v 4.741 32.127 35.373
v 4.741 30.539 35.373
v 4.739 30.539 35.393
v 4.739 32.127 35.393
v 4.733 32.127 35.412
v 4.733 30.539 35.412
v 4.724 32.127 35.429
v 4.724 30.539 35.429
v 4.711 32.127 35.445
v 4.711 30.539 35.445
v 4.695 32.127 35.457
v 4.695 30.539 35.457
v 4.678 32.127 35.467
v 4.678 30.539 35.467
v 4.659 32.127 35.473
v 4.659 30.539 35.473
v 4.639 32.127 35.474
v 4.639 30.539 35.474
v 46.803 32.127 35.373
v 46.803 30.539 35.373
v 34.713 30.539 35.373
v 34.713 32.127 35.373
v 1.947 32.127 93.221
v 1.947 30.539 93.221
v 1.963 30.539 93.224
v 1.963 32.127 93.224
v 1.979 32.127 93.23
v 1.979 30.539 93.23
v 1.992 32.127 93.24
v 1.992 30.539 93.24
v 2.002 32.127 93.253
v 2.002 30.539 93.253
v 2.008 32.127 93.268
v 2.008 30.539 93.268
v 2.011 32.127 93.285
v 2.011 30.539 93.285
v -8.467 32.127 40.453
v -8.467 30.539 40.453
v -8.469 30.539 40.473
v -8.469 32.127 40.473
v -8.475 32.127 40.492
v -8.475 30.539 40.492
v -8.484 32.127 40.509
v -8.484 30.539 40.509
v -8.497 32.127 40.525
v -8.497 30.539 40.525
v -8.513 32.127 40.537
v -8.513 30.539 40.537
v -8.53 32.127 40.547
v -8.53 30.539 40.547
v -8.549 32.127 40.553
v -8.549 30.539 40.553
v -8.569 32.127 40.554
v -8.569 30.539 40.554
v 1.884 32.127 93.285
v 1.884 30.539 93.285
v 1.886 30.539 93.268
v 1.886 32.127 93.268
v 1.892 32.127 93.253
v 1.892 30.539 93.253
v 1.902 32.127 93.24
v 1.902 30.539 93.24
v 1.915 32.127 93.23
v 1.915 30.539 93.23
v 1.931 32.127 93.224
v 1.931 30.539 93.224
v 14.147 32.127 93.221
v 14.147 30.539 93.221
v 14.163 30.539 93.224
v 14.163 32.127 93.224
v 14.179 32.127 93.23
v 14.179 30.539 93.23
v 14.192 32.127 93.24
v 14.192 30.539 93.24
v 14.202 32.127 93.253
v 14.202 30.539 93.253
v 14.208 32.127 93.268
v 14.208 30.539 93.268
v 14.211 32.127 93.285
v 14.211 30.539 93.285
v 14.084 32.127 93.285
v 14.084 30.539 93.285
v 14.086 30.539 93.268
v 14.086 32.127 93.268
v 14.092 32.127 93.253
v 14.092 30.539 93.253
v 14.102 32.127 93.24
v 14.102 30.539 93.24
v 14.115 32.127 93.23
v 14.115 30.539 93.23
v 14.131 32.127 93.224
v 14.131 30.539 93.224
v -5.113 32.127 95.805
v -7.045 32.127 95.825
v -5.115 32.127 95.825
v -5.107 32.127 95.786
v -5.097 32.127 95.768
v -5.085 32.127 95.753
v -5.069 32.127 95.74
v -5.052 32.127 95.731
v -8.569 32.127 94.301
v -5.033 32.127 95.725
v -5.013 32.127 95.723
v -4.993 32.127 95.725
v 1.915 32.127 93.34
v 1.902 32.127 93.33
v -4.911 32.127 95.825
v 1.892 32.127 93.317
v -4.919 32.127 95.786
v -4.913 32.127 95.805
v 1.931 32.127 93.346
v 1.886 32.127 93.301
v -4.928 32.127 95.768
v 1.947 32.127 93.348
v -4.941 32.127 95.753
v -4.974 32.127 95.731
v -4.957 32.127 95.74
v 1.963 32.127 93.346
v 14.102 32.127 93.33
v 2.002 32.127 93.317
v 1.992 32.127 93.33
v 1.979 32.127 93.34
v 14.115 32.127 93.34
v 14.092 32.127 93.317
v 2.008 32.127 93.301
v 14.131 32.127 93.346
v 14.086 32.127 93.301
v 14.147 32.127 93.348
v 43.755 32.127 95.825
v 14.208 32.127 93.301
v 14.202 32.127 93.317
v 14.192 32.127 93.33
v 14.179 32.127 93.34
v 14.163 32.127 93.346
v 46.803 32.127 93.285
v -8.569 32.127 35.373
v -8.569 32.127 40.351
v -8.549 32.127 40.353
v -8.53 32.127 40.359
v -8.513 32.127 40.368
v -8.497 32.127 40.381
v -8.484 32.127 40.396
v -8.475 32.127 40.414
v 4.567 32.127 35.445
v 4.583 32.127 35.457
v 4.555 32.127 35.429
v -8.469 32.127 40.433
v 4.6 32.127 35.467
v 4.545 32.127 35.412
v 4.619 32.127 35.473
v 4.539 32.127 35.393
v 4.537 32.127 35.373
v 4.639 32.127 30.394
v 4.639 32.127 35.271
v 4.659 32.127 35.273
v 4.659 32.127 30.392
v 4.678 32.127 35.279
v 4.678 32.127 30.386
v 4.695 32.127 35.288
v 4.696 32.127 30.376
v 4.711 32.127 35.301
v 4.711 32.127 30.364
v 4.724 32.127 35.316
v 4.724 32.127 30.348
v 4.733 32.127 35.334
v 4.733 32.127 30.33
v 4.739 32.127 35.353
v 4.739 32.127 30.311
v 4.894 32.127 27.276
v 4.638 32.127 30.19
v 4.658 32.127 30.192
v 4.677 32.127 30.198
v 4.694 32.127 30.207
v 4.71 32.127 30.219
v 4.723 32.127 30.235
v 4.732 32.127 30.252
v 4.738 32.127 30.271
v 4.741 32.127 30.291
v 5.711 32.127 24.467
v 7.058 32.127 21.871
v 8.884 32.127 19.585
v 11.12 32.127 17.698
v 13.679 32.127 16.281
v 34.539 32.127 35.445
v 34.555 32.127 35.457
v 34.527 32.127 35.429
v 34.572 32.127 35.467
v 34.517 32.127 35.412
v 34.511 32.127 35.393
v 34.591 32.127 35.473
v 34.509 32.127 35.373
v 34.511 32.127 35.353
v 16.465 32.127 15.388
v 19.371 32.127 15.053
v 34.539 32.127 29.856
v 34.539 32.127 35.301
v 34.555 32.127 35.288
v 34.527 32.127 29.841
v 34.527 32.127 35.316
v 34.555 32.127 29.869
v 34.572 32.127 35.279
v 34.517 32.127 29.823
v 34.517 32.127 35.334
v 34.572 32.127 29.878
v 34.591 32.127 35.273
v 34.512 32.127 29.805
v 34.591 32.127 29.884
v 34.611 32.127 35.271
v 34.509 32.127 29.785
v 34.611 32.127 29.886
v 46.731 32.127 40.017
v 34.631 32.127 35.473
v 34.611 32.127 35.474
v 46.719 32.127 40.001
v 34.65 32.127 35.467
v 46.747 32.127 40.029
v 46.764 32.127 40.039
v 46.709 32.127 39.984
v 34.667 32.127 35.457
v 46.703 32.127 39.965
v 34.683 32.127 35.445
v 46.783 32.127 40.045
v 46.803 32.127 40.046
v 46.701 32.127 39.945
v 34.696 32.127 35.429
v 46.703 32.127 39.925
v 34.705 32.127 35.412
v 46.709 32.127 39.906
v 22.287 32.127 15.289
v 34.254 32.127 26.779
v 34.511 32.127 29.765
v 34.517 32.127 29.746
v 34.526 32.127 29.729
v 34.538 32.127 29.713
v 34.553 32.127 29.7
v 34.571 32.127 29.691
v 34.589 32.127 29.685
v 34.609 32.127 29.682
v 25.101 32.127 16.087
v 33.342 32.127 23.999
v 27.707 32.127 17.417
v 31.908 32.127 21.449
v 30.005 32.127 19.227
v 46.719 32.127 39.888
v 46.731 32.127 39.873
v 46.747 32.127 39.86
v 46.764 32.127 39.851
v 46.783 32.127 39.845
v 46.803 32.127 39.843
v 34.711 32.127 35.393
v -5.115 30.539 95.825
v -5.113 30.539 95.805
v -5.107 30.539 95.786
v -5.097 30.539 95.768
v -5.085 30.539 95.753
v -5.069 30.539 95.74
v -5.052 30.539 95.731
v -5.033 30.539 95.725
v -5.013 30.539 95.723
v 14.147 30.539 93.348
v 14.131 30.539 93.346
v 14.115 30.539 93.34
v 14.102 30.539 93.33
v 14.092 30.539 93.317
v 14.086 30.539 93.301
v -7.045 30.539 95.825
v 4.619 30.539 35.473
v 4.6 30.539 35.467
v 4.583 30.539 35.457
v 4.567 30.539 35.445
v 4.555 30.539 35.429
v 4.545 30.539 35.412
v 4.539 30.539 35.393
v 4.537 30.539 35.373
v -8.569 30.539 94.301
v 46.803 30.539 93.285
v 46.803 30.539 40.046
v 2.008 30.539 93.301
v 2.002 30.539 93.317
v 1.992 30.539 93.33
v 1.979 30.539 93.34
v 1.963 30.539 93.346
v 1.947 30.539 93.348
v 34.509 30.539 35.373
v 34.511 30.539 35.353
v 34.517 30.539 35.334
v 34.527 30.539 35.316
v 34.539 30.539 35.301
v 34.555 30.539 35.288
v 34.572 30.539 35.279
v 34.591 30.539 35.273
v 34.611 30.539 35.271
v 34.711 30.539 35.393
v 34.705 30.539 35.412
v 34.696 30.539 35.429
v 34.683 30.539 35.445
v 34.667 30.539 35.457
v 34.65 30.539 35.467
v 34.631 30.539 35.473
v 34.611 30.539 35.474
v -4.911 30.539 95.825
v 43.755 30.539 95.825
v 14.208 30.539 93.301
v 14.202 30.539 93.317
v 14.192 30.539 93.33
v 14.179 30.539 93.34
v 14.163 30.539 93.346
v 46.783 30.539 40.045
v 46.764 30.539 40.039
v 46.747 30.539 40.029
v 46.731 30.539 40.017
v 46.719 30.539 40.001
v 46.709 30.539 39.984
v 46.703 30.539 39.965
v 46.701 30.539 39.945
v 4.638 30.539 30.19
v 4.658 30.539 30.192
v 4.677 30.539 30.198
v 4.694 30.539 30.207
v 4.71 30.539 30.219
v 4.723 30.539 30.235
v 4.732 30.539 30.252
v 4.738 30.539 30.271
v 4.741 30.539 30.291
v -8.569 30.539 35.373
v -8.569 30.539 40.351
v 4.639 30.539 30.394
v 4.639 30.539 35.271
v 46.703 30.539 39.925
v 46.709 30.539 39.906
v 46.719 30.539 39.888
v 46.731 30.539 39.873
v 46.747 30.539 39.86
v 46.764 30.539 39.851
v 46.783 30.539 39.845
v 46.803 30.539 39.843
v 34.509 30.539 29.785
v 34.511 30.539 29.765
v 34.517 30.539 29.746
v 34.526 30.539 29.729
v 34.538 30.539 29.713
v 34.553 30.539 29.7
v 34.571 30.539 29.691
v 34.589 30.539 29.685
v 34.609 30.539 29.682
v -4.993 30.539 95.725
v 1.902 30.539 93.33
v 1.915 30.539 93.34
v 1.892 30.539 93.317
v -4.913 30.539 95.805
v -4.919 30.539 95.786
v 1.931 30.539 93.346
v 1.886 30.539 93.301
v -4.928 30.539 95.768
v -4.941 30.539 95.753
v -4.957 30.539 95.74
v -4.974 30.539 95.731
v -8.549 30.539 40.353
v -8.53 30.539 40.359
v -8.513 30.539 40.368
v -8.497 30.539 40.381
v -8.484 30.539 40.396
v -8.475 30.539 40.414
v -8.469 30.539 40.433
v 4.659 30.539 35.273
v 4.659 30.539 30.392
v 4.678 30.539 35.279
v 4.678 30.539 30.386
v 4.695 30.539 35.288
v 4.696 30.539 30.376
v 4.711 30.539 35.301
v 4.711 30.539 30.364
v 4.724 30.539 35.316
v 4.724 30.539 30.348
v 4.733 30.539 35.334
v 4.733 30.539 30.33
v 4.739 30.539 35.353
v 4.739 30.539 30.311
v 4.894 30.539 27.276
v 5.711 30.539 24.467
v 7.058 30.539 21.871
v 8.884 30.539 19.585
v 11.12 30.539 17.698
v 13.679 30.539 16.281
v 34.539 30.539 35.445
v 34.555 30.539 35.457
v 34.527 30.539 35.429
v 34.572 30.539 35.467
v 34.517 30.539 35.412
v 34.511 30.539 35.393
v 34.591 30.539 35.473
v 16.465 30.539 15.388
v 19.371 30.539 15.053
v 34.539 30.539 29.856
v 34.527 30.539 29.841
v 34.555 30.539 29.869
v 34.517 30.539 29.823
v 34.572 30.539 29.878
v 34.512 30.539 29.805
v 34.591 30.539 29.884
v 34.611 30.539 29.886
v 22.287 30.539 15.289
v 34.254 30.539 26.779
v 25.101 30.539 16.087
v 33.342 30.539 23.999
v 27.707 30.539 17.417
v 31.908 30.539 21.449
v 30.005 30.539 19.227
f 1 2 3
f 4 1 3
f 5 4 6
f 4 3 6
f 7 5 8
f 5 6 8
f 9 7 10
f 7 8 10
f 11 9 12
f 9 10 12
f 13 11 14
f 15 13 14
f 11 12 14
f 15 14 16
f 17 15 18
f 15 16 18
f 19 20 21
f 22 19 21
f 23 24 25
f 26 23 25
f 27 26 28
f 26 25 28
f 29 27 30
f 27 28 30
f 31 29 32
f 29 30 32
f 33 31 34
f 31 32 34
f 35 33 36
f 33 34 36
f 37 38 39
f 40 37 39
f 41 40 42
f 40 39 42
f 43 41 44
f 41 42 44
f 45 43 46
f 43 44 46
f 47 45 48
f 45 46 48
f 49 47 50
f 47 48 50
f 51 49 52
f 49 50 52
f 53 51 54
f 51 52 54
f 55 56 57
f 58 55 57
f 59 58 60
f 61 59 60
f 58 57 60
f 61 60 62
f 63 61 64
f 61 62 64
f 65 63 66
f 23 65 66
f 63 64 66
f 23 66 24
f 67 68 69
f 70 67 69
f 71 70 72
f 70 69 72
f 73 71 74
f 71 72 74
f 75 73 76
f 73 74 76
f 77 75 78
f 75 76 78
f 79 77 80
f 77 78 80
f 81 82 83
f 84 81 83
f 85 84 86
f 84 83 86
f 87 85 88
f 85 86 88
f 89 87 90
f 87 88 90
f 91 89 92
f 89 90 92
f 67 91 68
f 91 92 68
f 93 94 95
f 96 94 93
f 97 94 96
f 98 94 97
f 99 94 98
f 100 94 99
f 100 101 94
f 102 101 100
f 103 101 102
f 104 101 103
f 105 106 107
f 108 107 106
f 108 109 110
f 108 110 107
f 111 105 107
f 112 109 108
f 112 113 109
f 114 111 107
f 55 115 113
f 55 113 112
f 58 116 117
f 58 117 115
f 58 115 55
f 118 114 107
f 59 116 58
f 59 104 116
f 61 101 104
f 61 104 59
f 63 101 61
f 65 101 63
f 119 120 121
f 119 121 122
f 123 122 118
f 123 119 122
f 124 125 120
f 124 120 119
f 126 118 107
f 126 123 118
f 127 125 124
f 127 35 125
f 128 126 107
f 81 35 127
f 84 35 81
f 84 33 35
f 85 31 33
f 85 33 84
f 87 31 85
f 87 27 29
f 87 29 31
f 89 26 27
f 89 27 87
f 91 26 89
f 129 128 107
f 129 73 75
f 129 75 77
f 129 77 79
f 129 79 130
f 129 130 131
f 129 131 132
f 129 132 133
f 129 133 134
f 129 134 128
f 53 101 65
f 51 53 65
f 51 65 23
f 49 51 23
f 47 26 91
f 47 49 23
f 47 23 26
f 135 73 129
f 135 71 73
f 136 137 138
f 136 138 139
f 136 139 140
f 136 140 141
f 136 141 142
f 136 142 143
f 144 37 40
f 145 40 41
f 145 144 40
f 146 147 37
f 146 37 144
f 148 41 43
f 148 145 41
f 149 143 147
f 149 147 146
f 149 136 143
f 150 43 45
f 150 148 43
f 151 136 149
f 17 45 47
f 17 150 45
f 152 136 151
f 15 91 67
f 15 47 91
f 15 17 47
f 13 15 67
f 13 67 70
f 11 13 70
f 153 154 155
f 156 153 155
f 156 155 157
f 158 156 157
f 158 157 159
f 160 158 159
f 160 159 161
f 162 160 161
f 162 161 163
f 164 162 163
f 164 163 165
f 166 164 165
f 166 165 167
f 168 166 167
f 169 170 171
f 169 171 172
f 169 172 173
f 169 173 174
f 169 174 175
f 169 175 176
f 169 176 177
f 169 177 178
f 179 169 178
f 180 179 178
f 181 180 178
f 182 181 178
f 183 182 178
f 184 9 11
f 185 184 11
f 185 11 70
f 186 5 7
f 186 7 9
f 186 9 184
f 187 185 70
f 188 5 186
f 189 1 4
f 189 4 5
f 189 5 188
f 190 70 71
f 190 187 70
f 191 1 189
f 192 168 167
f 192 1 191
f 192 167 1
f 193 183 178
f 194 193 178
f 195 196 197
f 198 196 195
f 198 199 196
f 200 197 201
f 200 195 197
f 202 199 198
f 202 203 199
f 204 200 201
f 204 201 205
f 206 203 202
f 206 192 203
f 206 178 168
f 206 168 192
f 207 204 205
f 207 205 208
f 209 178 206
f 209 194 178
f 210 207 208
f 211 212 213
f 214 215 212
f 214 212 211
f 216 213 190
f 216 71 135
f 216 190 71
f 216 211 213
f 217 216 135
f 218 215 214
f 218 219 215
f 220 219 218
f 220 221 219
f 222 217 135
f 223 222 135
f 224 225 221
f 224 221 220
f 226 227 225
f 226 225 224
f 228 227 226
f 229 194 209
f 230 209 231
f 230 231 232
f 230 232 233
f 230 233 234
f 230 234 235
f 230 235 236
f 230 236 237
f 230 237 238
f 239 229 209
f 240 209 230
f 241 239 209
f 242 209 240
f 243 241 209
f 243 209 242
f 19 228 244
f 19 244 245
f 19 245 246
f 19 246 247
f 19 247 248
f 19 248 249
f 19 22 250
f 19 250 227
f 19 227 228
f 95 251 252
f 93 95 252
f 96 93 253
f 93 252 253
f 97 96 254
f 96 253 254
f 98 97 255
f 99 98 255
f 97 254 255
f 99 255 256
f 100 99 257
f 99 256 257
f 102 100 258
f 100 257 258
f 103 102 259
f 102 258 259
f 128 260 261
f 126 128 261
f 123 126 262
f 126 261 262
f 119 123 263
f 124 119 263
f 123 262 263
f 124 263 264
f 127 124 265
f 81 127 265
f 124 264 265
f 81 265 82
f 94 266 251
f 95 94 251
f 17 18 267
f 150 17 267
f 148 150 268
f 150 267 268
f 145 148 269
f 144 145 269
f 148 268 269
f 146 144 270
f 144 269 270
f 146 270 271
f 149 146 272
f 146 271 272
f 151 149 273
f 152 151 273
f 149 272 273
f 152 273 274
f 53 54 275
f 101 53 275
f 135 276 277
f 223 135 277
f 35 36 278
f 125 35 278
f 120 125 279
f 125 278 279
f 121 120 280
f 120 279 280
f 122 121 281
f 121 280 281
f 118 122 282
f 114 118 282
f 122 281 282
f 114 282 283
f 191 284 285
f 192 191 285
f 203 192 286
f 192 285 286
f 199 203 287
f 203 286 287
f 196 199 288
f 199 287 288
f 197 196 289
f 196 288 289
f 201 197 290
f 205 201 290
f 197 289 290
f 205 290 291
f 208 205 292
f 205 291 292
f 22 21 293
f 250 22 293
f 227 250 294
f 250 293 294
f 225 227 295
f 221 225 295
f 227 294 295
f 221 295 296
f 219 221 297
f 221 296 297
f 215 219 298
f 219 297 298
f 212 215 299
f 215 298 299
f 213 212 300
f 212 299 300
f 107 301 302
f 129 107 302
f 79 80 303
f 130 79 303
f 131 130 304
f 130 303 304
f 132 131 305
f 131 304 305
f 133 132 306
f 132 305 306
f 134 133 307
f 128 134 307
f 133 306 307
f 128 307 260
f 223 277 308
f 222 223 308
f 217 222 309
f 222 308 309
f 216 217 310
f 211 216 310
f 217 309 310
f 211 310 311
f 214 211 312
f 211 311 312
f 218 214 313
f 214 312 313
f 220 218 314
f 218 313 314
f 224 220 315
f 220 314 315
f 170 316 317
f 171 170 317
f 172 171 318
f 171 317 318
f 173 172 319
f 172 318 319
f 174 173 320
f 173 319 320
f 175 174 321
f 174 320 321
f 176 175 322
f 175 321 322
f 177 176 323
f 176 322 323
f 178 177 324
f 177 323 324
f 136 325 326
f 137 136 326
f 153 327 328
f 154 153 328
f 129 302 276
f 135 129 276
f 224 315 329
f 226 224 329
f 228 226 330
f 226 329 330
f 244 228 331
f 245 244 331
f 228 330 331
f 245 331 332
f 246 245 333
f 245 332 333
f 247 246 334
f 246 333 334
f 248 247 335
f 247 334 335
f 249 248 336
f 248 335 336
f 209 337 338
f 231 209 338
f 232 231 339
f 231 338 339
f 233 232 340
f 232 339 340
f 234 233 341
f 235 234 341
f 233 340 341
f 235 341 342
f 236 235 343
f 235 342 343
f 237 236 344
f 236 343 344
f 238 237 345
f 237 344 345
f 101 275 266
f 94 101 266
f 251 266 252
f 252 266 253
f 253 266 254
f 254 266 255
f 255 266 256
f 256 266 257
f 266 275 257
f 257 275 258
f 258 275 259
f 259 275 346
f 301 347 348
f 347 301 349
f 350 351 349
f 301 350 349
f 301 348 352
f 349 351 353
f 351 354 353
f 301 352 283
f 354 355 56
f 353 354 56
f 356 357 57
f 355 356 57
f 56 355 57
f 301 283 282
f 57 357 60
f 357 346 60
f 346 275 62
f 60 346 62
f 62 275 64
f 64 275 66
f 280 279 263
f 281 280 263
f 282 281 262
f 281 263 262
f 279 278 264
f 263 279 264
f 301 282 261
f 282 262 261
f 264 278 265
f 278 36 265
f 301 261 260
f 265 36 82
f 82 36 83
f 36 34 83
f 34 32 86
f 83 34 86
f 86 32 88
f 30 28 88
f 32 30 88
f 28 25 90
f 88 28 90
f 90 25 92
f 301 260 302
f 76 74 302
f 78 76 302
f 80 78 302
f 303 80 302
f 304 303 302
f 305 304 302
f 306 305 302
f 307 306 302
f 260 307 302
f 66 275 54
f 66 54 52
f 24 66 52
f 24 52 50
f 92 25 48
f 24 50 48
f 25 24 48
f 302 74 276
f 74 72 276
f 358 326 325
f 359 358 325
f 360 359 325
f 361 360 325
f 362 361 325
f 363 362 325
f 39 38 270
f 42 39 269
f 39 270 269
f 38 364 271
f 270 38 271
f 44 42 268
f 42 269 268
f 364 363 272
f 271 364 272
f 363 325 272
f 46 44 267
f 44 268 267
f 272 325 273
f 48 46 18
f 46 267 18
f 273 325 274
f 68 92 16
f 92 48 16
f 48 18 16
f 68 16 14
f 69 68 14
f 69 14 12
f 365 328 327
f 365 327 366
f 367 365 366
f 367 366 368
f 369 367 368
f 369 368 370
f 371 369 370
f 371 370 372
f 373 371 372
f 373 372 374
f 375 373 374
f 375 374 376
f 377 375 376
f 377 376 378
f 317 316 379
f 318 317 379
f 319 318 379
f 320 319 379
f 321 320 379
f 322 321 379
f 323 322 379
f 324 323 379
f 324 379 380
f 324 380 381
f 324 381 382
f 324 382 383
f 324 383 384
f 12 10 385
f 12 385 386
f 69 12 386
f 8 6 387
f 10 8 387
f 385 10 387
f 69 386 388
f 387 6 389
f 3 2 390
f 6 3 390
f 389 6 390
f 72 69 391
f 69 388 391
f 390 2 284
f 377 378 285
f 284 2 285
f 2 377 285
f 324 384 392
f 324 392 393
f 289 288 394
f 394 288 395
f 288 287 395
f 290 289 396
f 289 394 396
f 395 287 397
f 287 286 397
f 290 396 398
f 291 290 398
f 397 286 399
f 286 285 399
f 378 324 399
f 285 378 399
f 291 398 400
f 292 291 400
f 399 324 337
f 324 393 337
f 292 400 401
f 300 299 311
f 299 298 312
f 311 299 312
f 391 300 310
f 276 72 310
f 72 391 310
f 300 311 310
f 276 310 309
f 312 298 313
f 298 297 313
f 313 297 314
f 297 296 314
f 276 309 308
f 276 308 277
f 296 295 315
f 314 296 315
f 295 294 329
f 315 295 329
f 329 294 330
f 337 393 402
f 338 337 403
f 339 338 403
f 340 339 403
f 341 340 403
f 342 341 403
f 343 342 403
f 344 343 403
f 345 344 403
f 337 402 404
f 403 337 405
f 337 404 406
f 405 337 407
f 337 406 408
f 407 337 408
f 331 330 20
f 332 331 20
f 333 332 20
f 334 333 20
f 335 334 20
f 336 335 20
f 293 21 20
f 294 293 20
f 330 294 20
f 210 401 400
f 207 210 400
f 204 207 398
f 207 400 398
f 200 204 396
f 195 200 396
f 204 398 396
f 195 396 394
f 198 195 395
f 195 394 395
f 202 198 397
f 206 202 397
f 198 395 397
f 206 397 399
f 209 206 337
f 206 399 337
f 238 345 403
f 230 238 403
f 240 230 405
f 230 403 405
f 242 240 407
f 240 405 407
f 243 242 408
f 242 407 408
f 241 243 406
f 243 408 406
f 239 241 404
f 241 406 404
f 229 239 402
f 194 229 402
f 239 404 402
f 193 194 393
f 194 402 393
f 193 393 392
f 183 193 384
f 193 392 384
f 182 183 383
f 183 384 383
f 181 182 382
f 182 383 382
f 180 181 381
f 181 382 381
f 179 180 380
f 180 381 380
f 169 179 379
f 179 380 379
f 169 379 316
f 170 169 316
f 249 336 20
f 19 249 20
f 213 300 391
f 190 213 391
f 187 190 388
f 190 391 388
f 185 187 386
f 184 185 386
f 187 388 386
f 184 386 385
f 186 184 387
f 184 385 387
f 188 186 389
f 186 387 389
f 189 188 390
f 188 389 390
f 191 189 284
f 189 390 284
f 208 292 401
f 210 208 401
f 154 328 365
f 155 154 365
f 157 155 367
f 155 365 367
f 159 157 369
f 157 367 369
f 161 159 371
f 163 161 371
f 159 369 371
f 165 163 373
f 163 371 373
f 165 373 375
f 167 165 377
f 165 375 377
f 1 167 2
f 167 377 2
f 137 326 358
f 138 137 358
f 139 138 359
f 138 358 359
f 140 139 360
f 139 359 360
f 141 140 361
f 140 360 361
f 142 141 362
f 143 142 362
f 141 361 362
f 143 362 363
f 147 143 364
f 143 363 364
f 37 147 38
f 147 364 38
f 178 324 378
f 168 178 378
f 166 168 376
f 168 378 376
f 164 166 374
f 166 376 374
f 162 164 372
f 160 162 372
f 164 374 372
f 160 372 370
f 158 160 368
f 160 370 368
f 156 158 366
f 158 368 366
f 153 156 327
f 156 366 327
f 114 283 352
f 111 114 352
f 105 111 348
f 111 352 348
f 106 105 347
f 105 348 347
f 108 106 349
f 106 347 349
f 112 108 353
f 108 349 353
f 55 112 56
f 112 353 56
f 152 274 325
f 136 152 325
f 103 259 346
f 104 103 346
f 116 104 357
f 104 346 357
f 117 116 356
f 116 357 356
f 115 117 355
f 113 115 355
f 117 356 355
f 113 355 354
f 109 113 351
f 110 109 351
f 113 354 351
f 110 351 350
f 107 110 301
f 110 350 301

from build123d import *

# Parameters (mm, degrees)
BOSS_EXTRUDE2_DEPTH = 1.5875


with BuildPart() as part:
    # Sketch3 → Boss-Extrude2 (new body)
    with BuildSketch(Plane(origin=(0, 30.53923904, 0), x_dir=(1, 0, 0), z_dir=(0, 1, 0))):
        with BuildLine():
            Line((46.80302417, -93.183255051), (46.80302417, -40.04646156))
            ThreePointArc((46.80302417, -40.04646156), (46.731182121, -40.016703609), (46.70142417, -39.94486156))
            ThreePointArc((46.70142417, -39.94486156), (46.731182121, -39.873019511), (46.80302417, -39.84326156))
            Line((46.80302417, -39.84326156), (46.80302417, -35.47446156))
            Line((46.80302417, -35.47446156), (46.80302417, -35.37286156))
            Line((46.80302417, -35.37286156), (46.70142417, -35.37286156))
            Line((46.70142417, -35.37286156), (34.71262417, -35.37286156))
            ThreePointArc((34.71262417, -35.37286156), (34.682866219, -35.444703609), (34.61102417, -35.47446156))
            ThreePointArc((34.61102417, -35.47446156), (34.539182121, -35.444703609), (34.50942417, -35.37286156))
            ThreePointArc((34.50942417, -35.37286156), (34.539182121, -35.301019511), (34.61102417, -35.27126156))
            Line((34.61102417, -35.27126156), (34.61102417, -29.88558893))
            ThreePointArc((34.61102417, -29.88558893), (34.539486295, -29.856142778), (34.50942417, -29.78486156))
            ThreePointArc((34.50942417, -29.78486156), (34.538144807, -29.713208308), (34.608937785, -29.682428156))
            ThreePointArc((34.608937785, -29.682428156), (19.371024177, -15.05286156), (4.637638035, -30.190416274))
            ThreePointArc((4.637638035, -30.190416274), (4.710051866, -30.219375736), (4.74059877, -30.29113436))
            ThreePointArc((4.74059877, -30.29113436), (4.711156288, -30.363523135), (4.63902417, -30.39358893))
            Line((4.63902417, -30.39358893), (4.63902417, -35.27126156))
            ThreePointArc((4.63902417, -35.27126156), (4.710866219, -35.301019511), (4.74062417, -35.37286156))
            ThreePointArc((4.74062417, -35.37286156), (4.710866219, -35.444703609), (4.63902417, -35.47446156))
            ThreePointArc((4.63902417, -35.47446156), (4.567182121, -35.444703609), (4.53742417, -35.37286156))
            Line((4.53742417, -35.37286156), (-8.46737583, -35.37286156))
            Line((-8.46737583, -35.37286156), (-8.56897583, -35.37286156))
            Line((-8.56897583, -35.37286156), (-8.56897583, -35.47446156))
            Line((-8.56897583, -35.47446156), (-8.56897583, -40.35126156))
            ThreePointArc((-8.56897583, -40.35126156), (-8.497133781, -40.381019511), (-8.46737583, -40.45286156))
            ThreePointArc((-8.46737583, -40.45286156), (-8.497133781, -40.524703609), (-8.56897583, -40.55446156))
            Line((-8.56897583, -40.55446156), (-8.56897583, -94.199276903))
            Line((-8.56897583, -94.199276903), (-8.56897583, -94.30086156))
            Line((-8.56897583, -94.30086156), (-8.497133781, -94.372703609))
            Line((-8.497133781, -94.372703609), (-7.116817879, -95.753019511))
            Line((-7.116817879, -95.753019511), (-7.04497583, -95.82486156))
            Line((-7.04497583, -95.82486156), (-6.943391173, -95.82486156))
            Line((-6.943391173, -95.82486156), (-5.11457583, -95.82486156))
            ThreePointArc((-5.11457583, -95.82486156), (-5.084817879, -95.753019511), (-5.01297583, -95.72326156))
            ThreePointArc((-5.01297583, -95.72326156), (-4.941133781, -95.753019511), (-4.91137583, -95.82486156))
            Line((-4.91137583, -95.82486156), (1.94703057, -95.82486156))
            Line((1.94703057, -95.82486156), (13.98703057, -95.82486156))
            Line((13.98703057, -95.82486156), (43.653417661, -95.82486156))
            Line((43.653417661, -95.82486156), (43.75502417, -95.82486156))
            Line((43.75502417, -95.82486156), (43.833075452, -95.759818825))
            Line((43.833075452, -95.759818825), (46.724972888, -93.349904295))
            Line((46.724972888, -93.349904295), (46.80302417, -93.28486156))
            Line((46.80302417, -93.28486156), (46.80302417, -93.183255051))
        make_face()
        with BuildLine():
            ThreePointArc((2.01053057, -93.28486156), (1.99193185, -93.329762841), (1.94703057, -93.34836156))
            ThreePointArc((1.94703057, -93.34836156), (1.902129289, -93.329762841), (1.88353057, -93.28486156))
            ThreePointArc((1.88353057, -93.28486156), (1.902129289, -93.239960279), (1.94703057, -93.22136156))
            ThreePointArc((1.94703057, -93.22136156), (1.99193185, -93.239960279), (2.01053057, -93.28486156))
        make_face(mode=Mode.SUBTRACT)
        with BuildLine():
            ThreePointArc((14.21053157, -93.28486156), (14.19193285, -93.329762841), (14.14703157, -93.34836156))
            ThreePointArc((14.14703157, -93.34836156), (14.102130289, -93.329762841), (14.08353157, -93.28486156))
            ThreePointArc((14.08353157, -93.28486156), (14.102130289, -93.239960279), (14.14703157, -93.22136156))
            ThreePointArc((14.14703157, -93.22136156), (14.19193285, -93.239960279), (14.21053157, -93.28486156))
        make_face(mode=Mode.SUBTRACT)
    extrude(amount=BOSS_EXTRUDE2_DEPTH)


solid = part.part
